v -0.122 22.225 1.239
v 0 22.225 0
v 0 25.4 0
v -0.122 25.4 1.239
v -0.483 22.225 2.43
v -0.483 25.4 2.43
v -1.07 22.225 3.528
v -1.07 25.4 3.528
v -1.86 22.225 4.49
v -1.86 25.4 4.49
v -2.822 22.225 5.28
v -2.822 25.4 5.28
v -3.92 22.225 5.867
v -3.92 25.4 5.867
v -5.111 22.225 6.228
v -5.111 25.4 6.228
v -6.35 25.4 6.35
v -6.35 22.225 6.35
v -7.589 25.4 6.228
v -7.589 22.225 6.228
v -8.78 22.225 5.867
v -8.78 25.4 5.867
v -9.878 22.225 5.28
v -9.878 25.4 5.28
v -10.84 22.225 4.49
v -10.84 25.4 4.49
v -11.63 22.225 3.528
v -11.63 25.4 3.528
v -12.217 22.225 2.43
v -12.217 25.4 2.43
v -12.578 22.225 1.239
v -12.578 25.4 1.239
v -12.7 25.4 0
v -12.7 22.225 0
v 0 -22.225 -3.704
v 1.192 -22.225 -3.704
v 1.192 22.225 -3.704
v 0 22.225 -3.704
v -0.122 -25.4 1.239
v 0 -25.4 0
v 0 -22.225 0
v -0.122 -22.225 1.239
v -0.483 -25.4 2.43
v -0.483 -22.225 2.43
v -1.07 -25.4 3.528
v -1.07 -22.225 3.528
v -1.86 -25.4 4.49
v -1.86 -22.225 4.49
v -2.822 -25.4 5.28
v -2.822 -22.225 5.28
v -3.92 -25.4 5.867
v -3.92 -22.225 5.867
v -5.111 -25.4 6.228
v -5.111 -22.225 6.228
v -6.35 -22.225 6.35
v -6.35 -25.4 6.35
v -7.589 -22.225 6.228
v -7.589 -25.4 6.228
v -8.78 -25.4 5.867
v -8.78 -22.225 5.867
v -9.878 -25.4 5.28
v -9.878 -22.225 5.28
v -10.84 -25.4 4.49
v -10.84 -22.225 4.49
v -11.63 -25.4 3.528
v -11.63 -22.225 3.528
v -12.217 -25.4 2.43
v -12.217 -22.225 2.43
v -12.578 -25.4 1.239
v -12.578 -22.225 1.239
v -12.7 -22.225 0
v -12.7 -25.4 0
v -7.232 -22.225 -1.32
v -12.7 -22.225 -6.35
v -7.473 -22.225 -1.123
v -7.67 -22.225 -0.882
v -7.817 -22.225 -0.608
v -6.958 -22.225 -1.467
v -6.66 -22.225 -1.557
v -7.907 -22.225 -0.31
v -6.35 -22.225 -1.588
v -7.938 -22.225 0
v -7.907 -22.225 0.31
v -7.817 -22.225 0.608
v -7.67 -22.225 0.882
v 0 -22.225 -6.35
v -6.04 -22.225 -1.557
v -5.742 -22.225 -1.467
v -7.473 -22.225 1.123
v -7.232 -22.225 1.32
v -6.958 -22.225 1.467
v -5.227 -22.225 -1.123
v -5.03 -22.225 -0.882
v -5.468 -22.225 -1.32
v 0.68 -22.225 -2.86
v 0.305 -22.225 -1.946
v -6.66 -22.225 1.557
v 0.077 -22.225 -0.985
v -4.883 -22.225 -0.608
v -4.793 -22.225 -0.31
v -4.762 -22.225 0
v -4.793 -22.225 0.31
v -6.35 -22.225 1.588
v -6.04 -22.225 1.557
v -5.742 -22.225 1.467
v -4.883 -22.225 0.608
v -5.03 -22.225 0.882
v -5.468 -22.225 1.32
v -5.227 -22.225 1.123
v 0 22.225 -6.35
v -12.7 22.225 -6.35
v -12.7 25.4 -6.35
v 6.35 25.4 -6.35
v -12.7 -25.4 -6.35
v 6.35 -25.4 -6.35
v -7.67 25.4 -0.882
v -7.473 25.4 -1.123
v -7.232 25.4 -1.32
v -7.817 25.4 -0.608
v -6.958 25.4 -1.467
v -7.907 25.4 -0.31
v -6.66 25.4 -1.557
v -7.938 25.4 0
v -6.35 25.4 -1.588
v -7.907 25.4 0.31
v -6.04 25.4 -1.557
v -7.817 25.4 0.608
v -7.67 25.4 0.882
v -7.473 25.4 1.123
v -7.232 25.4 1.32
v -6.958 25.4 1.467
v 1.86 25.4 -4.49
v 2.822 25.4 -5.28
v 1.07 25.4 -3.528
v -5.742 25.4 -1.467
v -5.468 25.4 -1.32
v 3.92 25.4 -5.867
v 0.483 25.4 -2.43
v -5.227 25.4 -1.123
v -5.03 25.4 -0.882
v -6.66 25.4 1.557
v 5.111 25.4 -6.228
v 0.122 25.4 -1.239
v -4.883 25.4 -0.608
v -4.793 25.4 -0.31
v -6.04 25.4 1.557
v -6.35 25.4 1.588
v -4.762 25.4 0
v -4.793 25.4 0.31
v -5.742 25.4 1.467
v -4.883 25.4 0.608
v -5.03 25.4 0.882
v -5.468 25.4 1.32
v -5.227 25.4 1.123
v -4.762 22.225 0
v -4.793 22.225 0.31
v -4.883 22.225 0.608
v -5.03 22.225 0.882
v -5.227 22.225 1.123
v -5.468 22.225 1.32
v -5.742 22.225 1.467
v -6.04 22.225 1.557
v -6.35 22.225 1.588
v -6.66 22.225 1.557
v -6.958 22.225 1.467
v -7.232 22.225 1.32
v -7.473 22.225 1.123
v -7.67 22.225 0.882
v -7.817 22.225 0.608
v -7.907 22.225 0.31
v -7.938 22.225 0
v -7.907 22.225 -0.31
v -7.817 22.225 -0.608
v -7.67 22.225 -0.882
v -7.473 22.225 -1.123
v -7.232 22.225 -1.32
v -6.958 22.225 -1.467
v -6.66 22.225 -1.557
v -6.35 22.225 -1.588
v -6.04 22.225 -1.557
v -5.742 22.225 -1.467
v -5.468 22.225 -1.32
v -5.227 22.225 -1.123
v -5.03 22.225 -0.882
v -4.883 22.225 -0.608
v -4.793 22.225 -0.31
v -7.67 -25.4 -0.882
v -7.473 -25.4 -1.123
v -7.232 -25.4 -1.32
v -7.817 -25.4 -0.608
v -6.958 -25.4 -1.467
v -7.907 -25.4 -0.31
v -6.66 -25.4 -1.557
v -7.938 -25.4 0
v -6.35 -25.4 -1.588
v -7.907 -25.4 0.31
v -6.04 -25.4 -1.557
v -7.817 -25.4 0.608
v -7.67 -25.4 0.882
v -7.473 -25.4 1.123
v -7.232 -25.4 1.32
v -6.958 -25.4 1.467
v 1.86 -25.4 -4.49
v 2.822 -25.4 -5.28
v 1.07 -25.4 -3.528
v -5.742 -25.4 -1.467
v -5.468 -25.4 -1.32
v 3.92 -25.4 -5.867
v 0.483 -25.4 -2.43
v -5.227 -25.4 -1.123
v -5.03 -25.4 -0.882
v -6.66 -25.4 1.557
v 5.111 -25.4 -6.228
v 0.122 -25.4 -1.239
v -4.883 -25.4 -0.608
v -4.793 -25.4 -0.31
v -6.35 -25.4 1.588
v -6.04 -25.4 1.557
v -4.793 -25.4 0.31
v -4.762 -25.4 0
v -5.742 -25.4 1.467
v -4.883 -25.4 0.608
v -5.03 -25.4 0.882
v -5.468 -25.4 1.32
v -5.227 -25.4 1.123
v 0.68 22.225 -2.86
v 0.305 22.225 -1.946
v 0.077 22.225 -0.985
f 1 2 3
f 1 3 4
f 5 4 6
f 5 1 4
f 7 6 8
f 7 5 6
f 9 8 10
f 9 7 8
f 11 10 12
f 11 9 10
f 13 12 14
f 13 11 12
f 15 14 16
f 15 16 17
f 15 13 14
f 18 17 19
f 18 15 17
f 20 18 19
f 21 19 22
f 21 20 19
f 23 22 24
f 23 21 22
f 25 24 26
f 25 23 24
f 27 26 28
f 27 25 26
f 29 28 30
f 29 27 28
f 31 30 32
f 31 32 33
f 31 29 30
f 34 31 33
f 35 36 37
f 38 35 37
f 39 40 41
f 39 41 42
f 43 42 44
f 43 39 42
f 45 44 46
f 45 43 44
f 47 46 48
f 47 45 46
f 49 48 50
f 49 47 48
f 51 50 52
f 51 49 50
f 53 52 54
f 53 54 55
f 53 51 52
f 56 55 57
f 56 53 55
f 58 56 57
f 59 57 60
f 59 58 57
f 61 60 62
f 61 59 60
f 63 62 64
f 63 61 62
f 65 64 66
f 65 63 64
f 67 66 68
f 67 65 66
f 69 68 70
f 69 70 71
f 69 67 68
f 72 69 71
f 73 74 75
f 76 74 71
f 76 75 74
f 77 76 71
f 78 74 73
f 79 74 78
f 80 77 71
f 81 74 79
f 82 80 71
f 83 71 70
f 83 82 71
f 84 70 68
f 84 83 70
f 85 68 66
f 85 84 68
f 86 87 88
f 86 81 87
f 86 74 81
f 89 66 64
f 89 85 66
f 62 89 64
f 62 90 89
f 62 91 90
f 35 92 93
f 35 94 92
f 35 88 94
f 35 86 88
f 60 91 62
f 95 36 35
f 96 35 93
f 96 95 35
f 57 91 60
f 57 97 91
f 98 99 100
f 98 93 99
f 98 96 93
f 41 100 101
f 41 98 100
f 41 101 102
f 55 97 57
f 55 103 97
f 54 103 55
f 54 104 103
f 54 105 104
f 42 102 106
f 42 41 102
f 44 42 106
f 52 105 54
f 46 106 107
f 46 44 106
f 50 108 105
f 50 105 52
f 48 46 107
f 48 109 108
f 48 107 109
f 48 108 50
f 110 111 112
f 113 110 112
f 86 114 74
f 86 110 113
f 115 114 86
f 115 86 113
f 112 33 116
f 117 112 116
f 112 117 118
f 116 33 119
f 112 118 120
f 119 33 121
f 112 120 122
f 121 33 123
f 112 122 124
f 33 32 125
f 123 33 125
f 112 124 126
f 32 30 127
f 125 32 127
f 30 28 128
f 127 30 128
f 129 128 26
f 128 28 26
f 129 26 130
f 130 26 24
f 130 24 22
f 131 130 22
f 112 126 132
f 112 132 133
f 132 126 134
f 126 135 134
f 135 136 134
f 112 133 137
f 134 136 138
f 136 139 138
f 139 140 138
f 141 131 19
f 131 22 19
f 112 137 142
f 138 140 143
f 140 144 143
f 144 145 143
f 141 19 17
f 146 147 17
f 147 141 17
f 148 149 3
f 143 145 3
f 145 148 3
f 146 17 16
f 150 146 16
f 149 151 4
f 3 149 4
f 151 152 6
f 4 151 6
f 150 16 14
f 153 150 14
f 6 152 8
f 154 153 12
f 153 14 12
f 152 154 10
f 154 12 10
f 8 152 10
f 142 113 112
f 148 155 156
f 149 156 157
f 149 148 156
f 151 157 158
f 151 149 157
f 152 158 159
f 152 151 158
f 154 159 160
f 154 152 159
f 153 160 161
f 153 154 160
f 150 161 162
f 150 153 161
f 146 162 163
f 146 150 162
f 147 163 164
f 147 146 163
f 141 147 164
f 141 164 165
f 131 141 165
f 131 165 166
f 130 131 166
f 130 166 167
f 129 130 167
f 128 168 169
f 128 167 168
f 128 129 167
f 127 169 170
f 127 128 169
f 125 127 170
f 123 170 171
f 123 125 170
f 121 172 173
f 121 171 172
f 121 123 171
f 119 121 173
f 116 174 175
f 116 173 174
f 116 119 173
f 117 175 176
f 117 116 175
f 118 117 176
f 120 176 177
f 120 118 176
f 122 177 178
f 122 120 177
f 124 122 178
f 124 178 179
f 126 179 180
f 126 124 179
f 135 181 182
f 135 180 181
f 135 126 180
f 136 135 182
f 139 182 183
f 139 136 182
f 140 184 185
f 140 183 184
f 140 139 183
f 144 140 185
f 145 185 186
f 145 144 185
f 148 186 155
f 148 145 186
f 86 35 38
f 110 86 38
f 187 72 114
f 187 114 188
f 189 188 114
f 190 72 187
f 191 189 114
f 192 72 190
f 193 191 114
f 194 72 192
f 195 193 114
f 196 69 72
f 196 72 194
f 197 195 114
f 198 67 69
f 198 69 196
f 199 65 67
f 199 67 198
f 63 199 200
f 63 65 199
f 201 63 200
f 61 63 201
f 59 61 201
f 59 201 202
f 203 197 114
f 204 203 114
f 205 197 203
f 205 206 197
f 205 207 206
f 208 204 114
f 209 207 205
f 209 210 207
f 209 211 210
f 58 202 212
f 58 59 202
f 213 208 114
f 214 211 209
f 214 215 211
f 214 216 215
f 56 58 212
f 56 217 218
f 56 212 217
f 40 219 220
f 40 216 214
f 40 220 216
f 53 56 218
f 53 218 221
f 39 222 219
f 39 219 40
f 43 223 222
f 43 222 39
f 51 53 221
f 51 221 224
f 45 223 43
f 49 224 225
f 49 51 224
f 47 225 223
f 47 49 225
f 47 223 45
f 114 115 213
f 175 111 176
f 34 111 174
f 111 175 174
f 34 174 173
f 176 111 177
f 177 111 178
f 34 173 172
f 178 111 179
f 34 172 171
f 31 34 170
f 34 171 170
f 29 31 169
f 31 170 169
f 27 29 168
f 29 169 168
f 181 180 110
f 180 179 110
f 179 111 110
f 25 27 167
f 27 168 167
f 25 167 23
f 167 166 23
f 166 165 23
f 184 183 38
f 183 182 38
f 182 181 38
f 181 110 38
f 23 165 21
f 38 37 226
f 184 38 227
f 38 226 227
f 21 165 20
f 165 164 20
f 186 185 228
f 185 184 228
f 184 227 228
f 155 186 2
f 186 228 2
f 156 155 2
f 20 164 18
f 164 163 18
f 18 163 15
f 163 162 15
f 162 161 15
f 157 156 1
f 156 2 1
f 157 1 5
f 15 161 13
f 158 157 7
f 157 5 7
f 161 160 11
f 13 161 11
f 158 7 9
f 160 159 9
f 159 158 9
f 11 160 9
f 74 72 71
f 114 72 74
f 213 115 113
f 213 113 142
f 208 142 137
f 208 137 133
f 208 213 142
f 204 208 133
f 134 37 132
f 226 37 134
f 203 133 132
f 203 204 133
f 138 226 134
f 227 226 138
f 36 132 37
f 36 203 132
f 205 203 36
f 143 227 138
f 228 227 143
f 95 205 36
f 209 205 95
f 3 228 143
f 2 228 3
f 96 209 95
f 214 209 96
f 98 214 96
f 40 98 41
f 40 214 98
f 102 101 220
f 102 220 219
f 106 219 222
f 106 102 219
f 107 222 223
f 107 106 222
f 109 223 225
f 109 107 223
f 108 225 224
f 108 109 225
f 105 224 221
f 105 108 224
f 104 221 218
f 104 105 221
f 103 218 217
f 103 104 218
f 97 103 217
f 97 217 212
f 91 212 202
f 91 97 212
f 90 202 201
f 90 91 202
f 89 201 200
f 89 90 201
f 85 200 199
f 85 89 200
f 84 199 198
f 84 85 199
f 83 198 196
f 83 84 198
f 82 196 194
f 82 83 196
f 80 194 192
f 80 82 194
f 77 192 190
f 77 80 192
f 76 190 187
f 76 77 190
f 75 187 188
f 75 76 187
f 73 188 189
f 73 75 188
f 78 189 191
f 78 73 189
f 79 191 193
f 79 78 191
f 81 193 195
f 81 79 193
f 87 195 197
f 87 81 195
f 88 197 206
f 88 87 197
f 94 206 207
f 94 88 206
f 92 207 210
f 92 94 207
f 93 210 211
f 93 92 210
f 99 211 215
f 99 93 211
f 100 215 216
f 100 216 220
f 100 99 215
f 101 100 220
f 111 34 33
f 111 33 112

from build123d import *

# Parameters (mm, degrees)
F0_R     = 1.5875
F1_DEPTH = 25.4
F2_W     = 44.45
F2_H     = 11.1125
F3_DEPTH = 25.4
F4_W     = 12.7
F4_H     = 44.45
F5_DEPTH = 2.646833


with BuildPart() as f1:
    # F0 (on Front) → F1 (new body, symmetric)
    with BuildSketch(Plane.XZ):
        with BuildLine():
            Line((0, -6.35), (6.35, -6.35))
            ThreePointArc((6.35, -6.35), (1.859872, -4.490128), (0, 0))
            ThreePointArc((0, 0), (-6.35, 6.35), (-12.7, 0))
            Line((-12.7, 0), (-12.7, -6.35))
            Line((-12.7, -6.35), (0, -6.35))
        make_face()
        with Locations((-6.35, 0)):
            Circle(F0_R, mode=Mode.SUBTRACT)
    extrude(amount=F1_DEPTH, both=True)

    # F2 (on Right) → F3 (cut, symmetric)
    with BuildSketch(Plane.YZ):
        with Locations((0, 1.852083)):
            Rectangle(F2_W, F2_H)
    extrude(amount=F3_DEPTH, both=True, mode=Mode.SUBTRACT)

    # F4 (on face) → F5 (cut, through all)
    with BuildSketch(Plane.XY.offset(-3.704167)):
        with Locations((-6.35, 0)):
            Rectangle(F4_W, F4_H)
    extrude(amount=-F5_DEPTH, mode=Mode.SUBTRACT)


solid = f1.part
